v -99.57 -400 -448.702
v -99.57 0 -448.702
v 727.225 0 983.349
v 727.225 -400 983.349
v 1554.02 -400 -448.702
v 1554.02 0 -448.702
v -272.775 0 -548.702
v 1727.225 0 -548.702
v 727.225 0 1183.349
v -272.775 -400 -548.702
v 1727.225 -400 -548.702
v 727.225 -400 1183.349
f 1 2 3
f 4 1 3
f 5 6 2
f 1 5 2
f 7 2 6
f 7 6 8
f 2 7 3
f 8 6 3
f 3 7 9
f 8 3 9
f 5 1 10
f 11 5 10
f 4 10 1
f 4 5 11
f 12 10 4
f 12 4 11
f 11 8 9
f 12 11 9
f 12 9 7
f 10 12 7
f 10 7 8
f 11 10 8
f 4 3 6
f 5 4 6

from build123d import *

# Parameters (mm, degrees)
F1_DEPTH = 400


with BuildPart() as f1:
    # F0 (on Front) → F1 (new body)
    with BuildSketch(Plane.XZ):
        Polygon((-99.569657, -448.701831), (-272.774738, -548.701831), (1727.225262, -548.701831), (1554.020181, -448.701831), align=None)
        Polygon((727.225262, 1183.348976), (-272.774738, -548.701831), (-99.569657, -448.701831), (727.225262, 983.348976), align=None)
        Polygon((1554.020181, -448.701831), (1727.225262, -548.701831), (727.225262, 1183.348976), (727.225262, 983.348976), align=None)
    extrude(amount=F1_DEPTH)


solid = f1.part
